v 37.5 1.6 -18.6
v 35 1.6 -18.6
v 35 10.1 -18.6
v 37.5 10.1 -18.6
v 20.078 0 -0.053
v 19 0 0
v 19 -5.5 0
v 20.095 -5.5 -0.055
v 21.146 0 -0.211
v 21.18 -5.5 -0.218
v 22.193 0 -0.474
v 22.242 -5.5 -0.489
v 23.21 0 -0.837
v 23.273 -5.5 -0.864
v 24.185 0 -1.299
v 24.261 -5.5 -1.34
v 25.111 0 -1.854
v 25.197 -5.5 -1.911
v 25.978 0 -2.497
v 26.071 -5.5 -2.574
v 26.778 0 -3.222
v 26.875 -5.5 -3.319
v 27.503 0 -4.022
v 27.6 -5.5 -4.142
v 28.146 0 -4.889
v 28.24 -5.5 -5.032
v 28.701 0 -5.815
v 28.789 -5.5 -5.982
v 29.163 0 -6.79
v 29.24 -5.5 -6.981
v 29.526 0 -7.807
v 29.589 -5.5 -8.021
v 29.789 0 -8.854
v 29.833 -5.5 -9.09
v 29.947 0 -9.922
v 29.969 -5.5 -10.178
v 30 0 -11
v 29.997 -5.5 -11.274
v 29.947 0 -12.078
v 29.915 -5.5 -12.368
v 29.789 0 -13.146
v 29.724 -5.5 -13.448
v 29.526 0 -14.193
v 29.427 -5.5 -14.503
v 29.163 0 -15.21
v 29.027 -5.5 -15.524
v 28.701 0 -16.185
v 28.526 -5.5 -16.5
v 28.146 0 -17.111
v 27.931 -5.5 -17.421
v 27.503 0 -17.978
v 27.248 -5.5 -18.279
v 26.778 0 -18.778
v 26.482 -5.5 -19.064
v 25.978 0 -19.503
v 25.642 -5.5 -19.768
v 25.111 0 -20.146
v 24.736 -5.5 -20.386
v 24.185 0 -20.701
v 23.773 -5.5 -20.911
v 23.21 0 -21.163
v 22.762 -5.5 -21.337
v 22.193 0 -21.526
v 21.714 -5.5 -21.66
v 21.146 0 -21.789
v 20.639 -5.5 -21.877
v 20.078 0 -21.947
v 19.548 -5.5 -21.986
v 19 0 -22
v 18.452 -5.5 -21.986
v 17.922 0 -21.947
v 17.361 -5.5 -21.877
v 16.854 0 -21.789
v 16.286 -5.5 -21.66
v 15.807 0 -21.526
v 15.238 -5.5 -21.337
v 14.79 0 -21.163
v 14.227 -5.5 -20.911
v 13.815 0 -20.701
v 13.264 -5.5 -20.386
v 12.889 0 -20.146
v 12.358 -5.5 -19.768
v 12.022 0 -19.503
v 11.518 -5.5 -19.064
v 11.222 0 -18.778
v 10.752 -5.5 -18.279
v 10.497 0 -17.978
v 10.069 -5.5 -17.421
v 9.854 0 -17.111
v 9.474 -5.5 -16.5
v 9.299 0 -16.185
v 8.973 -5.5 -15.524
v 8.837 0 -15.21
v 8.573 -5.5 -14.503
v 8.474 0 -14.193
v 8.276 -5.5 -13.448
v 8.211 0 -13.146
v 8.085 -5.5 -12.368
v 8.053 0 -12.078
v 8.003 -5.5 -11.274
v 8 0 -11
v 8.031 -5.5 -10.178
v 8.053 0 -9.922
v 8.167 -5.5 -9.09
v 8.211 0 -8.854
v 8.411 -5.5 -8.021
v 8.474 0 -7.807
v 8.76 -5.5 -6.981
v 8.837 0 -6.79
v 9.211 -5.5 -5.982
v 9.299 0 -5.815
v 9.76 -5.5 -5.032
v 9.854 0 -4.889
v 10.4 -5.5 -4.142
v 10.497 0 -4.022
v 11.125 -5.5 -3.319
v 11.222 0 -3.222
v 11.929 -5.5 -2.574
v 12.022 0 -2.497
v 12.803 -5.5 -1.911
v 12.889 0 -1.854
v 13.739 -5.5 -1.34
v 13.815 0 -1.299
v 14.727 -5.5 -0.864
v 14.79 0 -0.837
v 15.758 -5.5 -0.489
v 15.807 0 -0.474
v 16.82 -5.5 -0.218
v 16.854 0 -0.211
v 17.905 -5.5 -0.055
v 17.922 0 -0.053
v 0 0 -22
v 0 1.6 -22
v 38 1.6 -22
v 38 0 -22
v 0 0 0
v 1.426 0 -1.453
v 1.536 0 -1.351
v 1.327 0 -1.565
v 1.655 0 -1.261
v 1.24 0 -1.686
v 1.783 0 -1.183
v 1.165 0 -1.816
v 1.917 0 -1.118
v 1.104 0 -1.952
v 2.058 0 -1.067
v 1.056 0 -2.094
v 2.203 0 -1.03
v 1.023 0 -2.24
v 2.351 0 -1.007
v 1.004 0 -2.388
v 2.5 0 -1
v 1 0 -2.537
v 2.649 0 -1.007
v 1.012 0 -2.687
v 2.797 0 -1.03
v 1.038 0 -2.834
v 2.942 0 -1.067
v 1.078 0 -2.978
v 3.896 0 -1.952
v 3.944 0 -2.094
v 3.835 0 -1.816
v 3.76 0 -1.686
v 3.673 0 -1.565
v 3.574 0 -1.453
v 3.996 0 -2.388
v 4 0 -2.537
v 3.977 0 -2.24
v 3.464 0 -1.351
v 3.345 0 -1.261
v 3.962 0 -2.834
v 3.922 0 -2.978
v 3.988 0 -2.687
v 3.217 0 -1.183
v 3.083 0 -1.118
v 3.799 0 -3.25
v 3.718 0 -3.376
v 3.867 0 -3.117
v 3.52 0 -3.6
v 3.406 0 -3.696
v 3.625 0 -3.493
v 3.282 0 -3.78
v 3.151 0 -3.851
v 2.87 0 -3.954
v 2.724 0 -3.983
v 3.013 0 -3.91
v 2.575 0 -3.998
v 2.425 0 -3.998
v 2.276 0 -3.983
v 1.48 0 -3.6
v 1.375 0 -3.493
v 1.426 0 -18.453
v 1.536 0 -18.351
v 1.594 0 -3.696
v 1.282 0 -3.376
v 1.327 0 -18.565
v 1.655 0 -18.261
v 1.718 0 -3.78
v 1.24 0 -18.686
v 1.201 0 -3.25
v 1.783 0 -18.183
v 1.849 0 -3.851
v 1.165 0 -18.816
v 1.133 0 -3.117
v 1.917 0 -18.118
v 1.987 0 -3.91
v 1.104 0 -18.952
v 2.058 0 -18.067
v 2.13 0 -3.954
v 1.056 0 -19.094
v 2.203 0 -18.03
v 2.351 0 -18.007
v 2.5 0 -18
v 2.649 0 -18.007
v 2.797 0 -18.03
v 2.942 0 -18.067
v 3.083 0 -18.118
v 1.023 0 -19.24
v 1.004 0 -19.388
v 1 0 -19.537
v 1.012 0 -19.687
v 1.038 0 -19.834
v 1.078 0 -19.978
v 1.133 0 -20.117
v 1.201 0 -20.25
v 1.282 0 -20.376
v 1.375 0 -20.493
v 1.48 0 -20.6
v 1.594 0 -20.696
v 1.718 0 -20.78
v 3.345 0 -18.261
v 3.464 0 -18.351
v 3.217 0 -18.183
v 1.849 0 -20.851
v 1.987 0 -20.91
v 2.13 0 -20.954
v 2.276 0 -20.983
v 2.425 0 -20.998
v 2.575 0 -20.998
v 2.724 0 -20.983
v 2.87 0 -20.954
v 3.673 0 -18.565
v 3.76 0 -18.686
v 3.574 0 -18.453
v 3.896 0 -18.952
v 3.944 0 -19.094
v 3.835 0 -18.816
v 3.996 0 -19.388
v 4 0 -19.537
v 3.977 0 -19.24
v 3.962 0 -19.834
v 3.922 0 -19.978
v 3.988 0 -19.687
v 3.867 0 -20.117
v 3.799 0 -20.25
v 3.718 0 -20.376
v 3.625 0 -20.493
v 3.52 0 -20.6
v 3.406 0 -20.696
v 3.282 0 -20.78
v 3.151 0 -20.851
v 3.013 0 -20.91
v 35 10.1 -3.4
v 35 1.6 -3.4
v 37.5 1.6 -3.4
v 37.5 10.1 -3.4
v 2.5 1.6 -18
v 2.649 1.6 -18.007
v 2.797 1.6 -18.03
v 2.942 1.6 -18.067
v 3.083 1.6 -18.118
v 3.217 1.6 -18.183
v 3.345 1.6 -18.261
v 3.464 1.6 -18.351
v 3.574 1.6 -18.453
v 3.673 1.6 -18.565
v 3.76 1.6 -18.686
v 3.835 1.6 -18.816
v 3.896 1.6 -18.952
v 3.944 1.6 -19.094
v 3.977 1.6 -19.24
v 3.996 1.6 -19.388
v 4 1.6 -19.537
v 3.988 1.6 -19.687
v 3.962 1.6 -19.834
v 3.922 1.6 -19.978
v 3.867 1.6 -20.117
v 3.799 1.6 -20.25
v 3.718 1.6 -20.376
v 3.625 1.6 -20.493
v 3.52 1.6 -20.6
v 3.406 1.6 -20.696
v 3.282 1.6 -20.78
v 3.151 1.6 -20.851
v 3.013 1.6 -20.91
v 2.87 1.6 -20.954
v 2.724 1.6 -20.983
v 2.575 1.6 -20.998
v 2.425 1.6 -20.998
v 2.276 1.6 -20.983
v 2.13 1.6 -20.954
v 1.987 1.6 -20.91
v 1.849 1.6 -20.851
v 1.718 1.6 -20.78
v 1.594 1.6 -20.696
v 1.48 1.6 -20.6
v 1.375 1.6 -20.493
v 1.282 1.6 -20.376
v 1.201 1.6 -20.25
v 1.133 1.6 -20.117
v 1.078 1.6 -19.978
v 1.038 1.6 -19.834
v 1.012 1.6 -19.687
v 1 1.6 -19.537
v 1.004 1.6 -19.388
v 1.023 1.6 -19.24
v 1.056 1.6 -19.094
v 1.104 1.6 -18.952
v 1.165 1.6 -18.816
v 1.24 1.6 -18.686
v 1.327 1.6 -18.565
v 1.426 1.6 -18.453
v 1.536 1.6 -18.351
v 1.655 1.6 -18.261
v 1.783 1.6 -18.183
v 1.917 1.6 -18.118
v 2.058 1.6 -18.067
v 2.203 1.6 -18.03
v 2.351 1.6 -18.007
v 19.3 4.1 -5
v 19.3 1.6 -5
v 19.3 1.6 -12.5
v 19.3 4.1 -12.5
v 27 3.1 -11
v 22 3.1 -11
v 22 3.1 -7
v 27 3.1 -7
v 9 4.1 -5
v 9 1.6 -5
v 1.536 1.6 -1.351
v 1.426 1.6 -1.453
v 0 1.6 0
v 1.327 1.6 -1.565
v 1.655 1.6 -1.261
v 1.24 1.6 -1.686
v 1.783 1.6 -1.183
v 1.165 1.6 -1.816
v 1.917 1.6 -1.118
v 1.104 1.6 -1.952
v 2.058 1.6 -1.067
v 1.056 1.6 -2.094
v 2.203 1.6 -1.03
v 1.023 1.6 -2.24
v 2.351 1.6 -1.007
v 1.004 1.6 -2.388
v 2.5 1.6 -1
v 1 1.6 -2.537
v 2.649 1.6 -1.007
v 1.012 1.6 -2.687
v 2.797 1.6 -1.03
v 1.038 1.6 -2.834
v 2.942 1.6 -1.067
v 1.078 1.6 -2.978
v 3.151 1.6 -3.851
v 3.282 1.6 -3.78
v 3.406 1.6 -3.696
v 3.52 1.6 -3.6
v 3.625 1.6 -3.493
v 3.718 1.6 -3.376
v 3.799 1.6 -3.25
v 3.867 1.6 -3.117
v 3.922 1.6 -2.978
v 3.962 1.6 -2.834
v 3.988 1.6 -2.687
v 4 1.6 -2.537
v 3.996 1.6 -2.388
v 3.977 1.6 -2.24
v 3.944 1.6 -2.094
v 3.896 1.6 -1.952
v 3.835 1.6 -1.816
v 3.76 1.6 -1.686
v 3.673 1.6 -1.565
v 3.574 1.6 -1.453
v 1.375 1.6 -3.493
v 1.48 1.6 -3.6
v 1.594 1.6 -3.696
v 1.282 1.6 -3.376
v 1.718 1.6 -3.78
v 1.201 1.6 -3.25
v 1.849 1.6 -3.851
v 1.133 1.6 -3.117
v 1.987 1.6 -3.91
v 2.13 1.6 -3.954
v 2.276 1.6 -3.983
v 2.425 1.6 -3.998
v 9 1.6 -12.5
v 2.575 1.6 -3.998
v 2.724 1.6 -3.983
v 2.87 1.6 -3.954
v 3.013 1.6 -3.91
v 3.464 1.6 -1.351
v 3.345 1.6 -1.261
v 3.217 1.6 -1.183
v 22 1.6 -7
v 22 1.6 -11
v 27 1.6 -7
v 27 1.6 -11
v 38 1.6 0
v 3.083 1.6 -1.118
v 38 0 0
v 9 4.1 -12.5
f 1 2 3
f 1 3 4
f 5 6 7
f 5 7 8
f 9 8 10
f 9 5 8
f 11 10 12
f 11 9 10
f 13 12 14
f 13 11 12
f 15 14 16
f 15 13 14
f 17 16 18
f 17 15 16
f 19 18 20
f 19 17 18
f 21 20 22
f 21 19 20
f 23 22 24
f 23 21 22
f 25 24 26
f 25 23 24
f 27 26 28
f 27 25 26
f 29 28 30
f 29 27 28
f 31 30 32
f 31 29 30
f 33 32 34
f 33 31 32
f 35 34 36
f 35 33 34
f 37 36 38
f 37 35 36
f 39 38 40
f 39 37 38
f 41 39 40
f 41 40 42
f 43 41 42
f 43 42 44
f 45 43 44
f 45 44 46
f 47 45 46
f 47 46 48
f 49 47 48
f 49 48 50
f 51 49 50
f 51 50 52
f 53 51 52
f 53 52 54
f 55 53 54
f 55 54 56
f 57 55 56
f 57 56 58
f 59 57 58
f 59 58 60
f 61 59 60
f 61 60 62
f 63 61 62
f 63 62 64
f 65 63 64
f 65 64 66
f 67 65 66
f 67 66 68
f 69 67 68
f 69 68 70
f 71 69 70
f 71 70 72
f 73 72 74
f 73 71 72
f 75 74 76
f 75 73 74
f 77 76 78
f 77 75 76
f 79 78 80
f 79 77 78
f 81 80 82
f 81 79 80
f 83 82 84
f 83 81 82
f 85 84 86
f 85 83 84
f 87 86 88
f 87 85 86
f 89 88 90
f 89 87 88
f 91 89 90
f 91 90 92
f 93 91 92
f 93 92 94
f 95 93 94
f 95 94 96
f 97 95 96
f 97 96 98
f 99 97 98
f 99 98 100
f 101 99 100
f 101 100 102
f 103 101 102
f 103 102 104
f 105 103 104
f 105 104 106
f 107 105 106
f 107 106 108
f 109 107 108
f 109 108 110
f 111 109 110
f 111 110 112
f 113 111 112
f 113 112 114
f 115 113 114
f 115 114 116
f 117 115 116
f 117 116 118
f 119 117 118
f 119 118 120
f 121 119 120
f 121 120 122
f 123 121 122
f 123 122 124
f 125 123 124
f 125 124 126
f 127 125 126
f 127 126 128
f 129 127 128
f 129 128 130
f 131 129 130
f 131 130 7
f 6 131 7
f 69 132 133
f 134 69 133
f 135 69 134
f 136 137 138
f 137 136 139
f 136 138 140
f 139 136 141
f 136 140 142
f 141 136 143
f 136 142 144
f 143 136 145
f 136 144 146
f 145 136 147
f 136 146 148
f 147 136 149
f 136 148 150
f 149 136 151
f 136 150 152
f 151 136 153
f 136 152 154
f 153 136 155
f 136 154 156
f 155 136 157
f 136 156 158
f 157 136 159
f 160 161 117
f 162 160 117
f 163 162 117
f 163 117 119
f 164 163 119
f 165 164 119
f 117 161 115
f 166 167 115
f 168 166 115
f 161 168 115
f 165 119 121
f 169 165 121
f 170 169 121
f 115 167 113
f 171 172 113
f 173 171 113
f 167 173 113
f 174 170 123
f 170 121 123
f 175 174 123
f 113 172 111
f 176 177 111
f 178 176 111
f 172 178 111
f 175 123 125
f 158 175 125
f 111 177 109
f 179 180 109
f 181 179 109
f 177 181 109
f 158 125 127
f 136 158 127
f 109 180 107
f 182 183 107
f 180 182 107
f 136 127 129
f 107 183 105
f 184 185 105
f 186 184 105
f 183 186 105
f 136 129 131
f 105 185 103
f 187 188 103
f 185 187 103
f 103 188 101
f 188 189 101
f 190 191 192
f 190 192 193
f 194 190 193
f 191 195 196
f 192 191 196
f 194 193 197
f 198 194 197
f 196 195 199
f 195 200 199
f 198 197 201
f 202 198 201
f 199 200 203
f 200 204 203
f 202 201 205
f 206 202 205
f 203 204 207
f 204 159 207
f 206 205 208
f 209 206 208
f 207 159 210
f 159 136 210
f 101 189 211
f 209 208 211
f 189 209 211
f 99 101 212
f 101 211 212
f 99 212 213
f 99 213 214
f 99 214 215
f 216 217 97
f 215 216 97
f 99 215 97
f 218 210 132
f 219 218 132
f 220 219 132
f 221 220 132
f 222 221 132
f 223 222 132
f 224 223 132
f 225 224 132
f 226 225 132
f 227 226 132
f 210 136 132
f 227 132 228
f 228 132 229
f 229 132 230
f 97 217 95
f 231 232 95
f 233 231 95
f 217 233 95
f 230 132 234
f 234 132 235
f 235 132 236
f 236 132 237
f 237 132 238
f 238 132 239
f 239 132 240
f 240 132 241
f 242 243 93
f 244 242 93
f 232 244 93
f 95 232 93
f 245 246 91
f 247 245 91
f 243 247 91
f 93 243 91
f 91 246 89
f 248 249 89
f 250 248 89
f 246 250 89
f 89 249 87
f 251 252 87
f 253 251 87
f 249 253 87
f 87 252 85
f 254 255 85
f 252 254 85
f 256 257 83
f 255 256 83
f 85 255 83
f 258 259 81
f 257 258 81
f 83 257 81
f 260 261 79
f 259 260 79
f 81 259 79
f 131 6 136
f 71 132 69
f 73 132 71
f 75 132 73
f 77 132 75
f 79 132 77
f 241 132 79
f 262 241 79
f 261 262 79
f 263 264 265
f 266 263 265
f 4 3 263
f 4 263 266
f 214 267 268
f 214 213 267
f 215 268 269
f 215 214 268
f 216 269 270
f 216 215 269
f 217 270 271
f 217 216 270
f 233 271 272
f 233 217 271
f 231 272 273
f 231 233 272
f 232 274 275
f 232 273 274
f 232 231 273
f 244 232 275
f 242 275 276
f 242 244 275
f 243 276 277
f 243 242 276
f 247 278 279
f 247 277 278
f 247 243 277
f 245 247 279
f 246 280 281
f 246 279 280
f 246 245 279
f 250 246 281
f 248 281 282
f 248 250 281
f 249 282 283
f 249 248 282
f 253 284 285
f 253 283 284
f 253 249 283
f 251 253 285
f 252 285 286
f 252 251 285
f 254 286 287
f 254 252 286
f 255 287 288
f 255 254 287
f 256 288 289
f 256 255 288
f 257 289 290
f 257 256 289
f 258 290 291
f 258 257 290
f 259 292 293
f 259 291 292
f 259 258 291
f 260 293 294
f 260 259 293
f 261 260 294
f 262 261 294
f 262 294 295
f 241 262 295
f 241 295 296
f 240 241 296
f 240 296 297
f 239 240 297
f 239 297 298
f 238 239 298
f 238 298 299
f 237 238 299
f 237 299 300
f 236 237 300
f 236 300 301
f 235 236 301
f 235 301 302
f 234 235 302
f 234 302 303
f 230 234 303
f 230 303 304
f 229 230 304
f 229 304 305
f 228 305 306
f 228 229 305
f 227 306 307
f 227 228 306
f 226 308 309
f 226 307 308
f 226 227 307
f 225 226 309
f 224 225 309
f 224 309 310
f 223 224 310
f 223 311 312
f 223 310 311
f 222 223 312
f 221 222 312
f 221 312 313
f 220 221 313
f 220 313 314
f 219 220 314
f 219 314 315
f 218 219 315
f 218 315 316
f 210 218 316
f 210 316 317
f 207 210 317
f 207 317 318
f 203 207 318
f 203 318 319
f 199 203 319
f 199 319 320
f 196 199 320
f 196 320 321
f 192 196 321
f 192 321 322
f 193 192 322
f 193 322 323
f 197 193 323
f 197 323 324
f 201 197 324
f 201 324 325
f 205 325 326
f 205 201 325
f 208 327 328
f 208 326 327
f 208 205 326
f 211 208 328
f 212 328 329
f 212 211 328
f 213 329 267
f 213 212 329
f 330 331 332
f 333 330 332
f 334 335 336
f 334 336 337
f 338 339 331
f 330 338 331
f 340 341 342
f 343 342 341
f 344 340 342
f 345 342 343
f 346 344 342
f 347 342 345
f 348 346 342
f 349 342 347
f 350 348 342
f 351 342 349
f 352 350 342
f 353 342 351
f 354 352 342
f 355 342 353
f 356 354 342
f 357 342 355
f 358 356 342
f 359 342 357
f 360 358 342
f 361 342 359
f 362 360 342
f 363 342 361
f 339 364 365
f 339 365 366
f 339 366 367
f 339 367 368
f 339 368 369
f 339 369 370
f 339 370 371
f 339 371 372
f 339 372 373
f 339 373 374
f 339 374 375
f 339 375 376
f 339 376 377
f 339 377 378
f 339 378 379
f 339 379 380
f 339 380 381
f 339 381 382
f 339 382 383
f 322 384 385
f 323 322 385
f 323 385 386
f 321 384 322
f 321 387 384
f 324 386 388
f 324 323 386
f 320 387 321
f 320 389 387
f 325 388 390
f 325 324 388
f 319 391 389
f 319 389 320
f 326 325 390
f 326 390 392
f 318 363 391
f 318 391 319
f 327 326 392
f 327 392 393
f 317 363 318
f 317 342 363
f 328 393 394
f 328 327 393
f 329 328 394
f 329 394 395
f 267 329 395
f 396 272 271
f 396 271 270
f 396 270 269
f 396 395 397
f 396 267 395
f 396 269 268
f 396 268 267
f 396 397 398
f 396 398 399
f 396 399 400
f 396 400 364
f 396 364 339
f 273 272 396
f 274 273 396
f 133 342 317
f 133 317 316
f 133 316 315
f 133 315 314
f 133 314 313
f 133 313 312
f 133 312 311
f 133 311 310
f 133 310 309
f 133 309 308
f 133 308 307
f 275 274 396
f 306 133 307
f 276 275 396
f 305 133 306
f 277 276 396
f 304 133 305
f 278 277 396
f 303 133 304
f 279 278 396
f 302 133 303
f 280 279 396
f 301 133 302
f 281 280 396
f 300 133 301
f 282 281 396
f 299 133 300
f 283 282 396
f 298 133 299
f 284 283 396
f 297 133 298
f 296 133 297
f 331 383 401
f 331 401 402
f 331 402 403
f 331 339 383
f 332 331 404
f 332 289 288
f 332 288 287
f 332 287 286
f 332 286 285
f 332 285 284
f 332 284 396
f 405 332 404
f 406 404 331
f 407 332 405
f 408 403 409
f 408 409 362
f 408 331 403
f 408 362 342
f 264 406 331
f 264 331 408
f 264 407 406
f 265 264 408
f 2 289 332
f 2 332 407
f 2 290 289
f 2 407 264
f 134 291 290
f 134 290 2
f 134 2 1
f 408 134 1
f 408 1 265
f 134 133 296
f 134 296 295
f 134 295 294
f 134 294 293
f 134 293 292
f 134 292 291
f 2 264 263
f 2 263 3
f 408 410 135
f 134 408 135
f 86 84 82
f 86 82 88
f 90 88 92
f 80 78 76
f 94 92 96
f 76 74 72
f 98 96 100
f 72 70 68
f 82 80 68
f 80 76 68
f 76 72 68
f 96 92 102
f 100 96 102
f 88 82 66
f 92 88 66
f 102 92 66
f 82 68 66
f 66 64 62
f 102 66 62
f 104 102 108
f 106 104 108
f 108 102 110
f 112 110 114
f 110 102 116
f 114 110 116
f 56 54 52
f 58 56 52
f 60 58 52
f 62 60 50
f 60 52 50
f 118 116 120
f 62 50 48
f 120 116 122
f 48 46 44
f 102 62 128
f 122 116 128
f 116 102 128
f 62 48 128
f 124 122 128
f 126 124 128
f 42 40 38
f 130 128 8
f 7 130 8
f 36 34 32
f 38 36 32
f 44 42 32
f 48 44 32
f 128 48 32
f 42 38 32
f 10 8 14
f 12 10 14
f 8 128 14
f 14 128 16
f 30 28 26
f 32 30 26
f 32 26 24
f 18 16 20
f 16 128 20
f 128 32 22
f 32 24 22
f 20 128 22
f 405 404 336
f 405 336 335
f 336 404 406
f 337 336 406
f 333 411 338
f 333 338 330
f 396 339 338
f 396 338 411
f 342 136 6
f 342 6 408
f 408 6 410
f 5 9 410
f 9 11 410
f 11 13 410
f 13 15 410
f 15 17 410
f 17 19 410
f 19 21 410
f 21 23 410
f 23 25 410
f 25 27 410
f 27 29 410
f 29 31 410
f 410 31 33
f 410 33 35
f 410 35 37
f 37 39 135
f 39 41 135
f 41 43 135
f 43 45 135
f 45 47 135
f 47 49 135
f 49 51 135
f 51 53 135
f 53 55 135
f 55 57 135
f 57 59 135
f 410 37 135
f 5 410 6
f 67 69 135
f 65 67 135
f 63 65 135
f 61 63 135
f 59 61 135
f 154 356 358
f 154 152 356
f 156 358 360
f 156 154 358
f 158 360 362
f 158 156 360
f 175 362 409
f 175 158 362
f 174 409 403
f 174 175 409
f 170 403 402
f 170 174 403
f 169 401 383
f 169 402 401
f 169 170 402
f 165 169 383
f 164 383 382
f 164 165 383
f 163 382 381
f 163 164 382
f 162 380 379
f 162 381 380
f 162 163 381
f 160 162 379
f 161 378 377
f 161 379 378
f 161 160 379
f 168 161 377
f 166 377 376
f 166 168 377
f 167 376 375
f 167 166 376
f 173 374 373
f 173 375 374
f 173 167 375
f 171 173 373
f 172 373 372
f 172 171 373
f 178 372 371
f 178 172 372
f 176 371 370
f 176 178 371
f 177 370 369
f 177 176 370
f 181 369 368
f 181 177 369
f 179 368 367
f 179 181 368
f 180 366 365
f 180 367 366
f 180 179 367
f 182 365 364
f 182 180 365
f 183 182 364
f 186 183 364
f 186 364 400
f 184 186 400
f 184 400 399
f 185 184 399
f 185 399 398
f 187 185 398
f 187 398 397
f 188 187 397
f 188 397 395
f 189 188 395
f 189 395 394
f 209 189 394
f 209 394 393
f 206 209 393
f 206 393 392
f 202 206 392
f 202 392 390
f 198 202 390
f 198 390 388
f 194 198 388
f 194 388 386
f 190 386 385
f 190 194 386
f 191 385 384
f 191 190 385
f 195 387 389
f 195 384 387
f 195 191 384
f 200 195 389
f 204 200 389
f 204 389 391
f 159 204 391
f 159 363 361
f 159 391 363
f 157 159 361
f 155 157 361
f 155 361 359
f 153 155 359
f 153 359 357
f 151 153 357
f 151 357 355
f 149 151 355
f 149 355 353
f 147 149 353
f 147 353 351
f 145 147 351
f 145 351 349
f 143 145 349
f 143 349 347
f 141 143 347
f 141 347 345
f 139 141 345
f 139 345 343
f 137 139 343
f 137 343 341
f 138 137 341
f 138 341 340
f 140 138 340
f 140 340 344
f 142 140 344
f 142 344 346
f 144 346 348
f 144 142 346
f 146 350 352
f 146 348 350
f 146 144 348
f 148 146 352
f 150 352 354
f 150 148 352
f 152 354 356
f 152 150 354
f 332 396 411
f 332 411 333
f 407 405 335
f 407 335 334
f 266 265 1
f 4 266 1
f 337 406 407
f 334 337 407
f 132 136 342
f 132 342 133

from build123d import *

# Parameters (mm, degrees)
SKETCH1_W               = 38
SKETCH1_H               = 22
PCB_DEPTH               = 1.6
MOUNT_HOLE_1_DEPTH      = 44.938138331
MOUNT_HOLE_1_DEPTH_BACK = 44.938138331
SKETCH2_R               = 1.5
MOUNT_HOLE_2_DEPTH      = 44.938138331
MOUNT_HOLE_2_DEPTH_BACK = 44.938138331
SKETCH3_R               = 1.5
DS3231_IC_START         = 1.6
SKETCH4_W               = 10.3
SKETCH4_H               = 7.5
DS3231_IC_DEPTH         = 2.5
AT24C32_EEPROM_START    = 1.6
SKETCH5_W               = 5
SKETCH5_H               = 4
AT24C32_EEPROM_DEPTH    = 1.5
HEADER_6PIN_START       = 1.6
SKETCH6_W               = 2.5
SKETCH6_H               = 15.2
HEADER_6PIN_DEPTH       = 8.5
SKETCH7_R               = 11
CR2032_HOLDER_DEPTH     = 5.5


with BuildPart() as part:
    # Sketch1 → PCB (new body)
    with BuildSketch(Plane(origin=(0, 0, 0), x_dir=(1, 0, 0), z_dir=(0, 1, 0))):
        with Locations((19, 11)):
            Rectangle(SKETCH1_W, SKETCH1_H)
    extrude(amount=PCB_DEPTH)

    # Sketch2 → Mount_hole_1 (cut, two sides: drawn at the far end of the back side and taken through both)
    with BuildSketch(Plane(origin=(0, 0, 0), x_dir=(1, 0, 0), z_dir=(0, 1, 0)).offset(-MOUNT_HOLE_1_DEPTH_BACK)):
        with Locations(Location((2.5, 19.5, 0), (0, 0, 270))):
            Circle(SKETCH2_R)
    extrude(amount=MOUNT_HOLE_1_DEPTH + MOUNT_HOLE_1_DEPTH_BACK, mode=Mode.SUBTRACT)

    # Sketch3 → Mount_hole_2 (cut, two sides: drawn at the far end of the back side and taken through both)
    with BuildSketch(Plane(origin=(0, 0, 0), x_dir=(1, 0, 0), z_dir=(0, 1, 0)).offset(-MOUNT_HOLE_2_DEPTH_BACK)):
        with Locations(Location((2.5, 2.5, 0), (0, 0, 270))):
            Circle(SKETCH3_R)
    extrude(amount=MOUNT_HOLE_2_DEPTH + MOUNT_HOLE_2_DEPTH_BACK, mode=Mode.SUBTRACT)

    # Sketch4 → DS3231_IC (add)
    with BuildSketch(Plane(origin=(0, 0, 0), x_dir=(1, 0, 0), z_dir=(0, 1, 0)).offset(DS3231_IC_START)):
        with Locations((14.15, 8.75)):
            Rectangle(SKETCH4_W, SKETCH4_H)
    extrude(amount=DS3231_IC_DEPTH)

    # Sketch5 → AT24C32_EEPROM (add)
    with BuildSketch(Plane(origin=(0, 0, 0), x_dir=(1, 0, 0), z_dir=(0, 1, 0)).offset(AT24C32_EEPROM_START)):
        with Locations((24.5, 9)):
            Rectangle(SKETCH5_W, SKETCH5_H)
    extrude(amount=AT24C32_EEPROM_DEPTH)

    # Sketch6 → Header_6pin (add)
    with BuildSketch(Plane(origin=(0, 0, 0), x_dir=(1, 0, 0), z_dir=(0, 1, 0)).offset(HEADER_6PIN_START)):
        with Locations((36.25, 11)):
            Rectangle(SKETCH6_W, SKETCH6_H)
    extrude(amount=HEADER_6PIN_DEPTH)

    # Sketch7 → CR2032_holder (add)
    with BuildSketch(Plane(origin=(0, 0, 0), x_dir=(1, 0, 0), z_dir=(0, 1, 0))):
        with Locations(Location((19, 11, 0), (0, 0, 270))):
            Circle(SKETCH7_R)
    extrude(amount=-CR2032_HOLDER_DEPTH)


solid = part.part
